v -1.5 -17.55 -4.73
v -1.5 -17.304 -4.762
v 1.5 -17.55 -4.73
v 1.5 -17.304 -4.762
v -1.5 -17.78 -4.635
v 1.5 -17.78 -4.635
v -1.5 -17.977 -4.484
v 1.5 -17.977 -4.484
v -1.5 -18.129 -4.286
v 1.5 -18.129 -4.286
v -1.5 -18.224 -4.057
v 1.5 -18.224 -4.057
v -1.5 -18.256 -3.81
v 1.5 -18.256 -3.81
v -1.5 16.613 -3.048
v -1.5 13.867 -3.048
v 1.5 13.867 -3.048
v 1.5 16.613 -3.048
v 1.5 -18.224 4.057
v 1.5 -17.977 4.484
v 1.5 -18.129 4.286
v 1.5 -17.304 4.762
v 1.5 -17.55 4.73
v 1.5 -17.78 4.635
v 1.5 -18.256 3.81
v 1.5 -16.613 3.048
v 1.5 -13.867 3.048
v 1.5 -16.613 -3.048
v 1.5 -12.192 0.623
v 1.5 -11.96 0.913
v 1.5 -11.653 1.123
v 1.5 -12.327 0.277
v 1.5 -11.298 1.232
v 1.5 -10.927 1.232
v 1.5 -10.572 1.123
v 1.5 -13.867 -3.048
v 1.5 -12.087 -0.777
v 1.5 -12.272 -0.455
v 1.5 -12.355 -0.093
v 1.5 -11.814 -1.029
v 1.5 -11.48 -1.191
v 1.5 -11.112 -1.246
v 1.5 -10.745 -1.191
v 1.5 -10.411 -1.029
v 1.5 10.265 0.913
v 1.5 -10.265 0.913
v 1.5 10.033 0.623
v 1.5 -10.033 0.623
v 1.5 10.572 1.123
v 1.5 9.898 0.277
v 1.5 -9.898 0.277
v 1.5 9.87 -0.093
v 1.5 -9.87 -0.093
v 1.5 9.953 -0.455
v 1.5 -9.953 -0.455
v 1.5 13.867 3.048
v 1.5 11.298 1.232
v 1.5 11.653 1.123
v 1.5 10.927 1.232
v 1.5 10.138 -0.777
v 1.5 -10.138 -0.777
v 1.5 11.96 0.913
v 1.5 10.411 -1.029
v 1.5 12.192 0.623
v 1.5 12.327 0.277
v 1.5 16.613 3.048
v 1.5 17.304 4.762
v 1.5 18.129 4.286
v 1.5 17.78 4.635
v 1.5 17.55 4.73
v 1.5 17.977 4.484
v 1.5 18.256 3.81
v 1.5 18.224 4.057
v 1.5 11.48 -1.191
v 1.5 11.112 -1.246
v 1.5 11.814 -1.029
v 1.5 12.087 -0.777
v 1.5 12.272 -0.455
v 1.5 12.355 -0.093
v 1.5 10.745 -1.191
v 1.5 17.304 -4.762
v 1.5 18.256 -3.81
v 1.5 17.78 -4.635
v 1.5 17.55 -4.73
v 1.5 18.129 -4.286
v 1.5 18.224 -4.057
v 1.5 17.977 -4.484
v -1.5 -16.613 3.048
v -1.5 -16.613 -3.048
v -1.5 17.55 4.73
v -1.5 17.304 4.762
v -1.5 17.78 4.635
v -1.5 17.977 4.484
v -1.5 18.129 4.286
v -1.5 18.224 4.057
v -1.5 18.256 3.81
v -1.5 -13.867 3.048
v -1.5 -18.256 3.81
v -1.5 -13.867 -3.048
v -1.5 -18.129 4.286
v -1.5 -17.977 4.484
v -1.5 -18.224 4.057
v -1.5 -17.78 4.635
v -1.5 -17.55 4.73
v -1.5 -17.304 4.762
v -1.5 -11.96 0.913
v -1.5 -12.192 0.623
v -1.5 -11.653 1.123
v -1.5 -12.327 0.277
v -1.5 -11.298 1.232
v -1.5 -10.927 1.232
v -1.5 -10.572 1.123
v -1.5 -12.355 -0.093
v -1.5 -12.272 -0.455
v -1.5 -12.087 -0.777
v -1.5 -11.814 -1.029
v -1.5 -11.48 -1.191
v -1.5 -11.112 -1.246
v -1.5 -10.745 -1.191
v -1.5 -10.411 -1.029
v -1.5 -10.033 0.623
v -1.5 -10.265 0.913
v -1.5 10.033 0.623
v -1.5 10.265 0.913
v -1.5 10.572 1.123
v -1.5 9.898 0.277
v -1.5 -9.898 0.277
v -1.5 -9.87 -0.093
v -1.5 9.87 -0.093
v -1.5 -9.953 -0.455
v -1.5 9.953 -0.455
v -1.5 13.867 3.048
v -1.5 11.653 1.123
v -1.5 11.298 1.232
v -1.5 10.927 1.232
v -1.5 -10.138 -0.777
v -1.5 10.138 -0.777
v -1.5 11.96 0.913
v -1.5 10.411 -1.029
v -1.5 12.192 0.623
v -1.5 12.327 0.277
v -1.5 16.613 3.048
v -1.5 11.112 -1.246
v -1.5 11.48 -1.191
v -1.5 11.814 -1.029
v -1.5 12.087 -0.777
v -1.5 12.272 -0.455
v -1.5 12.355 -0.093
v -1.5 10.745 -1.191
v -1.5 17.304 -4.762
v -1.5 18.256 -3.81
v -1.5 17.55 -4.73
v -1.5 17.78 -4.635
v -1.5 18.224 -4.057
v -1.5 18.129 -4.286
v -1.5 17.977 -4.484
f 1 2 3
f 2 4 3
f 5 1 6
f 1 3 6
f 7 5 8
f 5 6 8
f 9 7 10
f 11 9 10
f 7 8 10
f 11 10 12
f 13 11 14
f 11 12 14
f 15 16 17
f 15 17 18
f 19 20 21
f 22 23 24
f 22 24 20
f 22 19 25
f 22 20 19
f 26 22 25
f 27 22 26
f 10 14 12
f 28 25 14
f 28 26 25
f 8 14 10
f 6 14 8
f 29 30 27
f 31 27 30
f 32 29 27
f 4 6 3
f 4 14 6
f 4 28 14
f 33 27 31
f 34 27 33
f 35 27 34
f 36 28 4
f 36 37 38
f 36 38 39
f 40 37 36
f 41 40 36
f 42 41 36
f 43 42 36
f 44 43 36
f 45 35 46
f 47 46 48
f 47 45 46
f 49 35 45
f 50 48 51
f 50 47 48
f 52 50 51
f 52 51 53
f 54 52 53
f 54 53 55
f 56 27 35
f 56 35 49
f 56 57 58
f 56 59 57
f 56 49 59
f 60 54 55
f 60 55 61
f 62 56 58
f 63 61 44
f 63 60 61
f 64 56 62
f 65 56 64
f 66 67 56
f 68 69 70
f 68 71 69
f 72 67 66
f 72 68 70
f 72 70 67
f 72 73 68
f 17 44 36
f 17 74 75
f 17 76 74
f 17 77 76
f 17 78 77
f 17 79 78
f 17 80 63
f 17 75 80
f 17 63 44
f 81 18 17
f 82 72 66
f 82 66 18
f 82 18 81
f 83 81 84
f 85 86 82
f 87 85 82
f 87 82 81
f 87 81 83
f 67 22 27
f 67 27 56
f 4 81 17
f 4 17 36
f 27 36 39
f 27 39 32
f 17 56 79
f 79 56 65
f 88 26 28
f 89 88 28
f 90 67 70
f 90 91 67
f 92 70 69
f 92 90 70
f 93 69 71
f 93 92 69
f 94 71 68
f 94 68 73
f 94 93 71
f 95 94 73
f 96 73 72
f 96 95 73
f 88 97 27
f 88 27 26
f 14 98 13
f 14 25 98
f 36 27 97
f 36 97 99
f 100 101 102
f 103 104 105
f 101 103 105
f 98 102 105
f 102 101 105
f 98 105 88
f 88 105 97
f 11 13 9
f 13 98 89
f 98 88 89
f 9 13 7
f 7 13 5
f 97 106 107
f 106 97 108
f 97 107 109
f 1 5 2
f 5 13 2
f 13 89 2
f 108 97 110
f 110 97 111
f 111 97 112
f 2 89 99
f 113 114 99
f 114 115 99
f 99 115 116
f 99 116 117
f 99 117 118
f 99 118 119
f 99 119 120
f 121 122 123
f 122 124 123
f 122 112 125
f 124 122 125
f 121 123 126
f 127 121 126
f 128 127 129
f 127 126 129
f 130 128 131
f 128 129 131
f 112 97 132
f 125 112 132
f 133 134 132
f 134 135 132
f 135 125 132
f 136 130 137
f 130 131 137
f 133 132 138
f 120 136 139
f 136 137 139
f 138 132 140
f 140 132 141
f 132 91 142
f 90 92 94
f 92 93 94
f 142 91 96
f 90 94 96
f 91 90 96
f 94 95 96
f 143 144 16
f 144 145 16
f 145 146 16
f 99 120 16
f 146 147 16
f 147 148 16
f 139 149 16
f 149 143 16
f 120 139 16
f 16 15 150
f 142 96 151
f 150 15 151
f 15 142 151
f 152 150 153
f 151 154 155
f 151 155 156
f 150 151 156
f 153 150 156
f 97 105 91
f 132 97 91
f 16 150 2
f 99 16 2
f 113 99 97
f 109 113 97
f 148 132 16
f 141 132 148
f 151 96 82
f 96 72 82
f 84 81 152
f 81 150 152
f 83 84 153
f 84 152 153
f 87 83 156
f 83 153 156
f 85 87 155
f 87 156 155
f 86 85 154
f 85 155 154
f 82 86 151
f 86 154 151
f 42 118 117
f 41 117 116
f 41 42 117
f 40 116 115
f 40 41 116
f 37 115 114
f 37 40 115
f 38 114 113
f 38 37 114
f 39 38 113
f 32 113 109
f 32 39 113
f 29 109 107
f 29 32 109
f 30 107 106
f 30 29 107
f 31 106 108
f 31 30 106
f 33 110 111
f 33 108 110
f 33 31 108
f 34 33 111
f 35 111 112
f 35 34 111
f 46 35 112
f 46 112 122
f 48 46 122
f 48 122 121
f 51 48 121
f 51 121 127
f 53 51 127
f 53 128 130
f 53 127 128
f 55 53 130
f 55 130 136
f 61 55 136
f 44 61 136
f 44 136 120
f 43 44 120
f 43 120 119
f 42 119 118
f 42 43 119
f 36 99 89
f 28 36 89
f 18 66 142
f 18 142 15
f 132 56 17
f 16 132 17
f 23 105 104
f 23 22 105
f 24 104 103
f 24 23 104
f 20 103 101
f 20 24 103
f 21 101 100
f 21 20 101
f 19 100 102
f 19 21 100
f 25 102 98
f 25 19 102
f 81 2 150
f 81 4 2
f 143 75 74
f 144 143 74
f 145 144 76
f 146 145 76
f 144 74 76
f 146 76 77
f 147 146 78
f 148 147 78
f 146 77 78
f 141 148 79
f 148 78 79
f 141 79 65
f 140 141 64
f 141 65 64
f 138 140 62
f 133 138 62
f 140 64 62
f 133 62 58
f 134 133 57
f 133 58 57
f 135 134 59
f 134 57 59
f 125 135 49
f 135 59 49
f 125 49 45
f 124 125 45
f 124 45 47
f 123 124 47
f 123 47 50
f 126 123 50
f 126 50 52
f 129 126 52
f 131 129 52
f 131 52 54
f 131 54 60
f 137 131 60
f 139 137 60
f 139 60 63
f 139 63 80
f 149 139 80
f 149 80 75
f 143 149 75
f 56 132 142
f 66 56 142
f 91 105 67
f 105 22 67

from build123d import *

# Parameters (mm, degrees)
SKETCH1_W           = 9.525
SKETCH1_H           = 36.5125
BOSS_EXTRUDE1_DEPTH = 1.5
FILLET1_R           = 0.9525
SKETCH2_R           = 1.246
SKETCH2_W           = 6.096
SKETCH2_H           = 2.746
CUT_EXTRUDE1_DEPTH  = 20.104242207


with BuildPart() as part:
    # Sketch1 → Boss-Extrude1 (new, symmetric)
    with BuildSketch(Plane(origin=(0, 0, 0), x_dir=(0, 0, -1), z_dir=(1, 0, 0))):
        Rectangle(SKETCH1_W, SKETCH1_H)
    extrude(amount=BOSS_EXTRUDE1_DEPTH, both=True)

    # Fillet1
    fillet1_edges = [part.edges().sort_by_distance(p)[0] for p in [
        (0, 18.25625, 4.7625),
        (0, 18.25625, -4.7625),
        (0, -18.25625, -4.7625),
        (0, -18.25625, 4.7625),
    ]]
    fillet(fillet1_edges, radius=FILLET1_R)

    # Sketch2 → Cut-Extrude1 (cut, through all)
    with BuildSketch(Plane(origin=(1.5, 0, 0), x_dir=(0, 0, -1), z_dir=(1, 0, 0))):
        with Locations((0, 11.1125)):
            Circle(SKETCH2_R)
        with Locations((0, 15.24)):
            Rectangle(SKETCH2_W, SKETCH2_H)
    cut_extrude1 = extrude(amount=-CUT_EXTRUDE1_DEPTH, mode=Mode.SUBTRACT)

    # Mirror1: Cut-Extrude1 across plane
    add(cut_extrude1.mirror(Plane.ZX), mode=Mode.SUBTRACT)


solid = part.part
